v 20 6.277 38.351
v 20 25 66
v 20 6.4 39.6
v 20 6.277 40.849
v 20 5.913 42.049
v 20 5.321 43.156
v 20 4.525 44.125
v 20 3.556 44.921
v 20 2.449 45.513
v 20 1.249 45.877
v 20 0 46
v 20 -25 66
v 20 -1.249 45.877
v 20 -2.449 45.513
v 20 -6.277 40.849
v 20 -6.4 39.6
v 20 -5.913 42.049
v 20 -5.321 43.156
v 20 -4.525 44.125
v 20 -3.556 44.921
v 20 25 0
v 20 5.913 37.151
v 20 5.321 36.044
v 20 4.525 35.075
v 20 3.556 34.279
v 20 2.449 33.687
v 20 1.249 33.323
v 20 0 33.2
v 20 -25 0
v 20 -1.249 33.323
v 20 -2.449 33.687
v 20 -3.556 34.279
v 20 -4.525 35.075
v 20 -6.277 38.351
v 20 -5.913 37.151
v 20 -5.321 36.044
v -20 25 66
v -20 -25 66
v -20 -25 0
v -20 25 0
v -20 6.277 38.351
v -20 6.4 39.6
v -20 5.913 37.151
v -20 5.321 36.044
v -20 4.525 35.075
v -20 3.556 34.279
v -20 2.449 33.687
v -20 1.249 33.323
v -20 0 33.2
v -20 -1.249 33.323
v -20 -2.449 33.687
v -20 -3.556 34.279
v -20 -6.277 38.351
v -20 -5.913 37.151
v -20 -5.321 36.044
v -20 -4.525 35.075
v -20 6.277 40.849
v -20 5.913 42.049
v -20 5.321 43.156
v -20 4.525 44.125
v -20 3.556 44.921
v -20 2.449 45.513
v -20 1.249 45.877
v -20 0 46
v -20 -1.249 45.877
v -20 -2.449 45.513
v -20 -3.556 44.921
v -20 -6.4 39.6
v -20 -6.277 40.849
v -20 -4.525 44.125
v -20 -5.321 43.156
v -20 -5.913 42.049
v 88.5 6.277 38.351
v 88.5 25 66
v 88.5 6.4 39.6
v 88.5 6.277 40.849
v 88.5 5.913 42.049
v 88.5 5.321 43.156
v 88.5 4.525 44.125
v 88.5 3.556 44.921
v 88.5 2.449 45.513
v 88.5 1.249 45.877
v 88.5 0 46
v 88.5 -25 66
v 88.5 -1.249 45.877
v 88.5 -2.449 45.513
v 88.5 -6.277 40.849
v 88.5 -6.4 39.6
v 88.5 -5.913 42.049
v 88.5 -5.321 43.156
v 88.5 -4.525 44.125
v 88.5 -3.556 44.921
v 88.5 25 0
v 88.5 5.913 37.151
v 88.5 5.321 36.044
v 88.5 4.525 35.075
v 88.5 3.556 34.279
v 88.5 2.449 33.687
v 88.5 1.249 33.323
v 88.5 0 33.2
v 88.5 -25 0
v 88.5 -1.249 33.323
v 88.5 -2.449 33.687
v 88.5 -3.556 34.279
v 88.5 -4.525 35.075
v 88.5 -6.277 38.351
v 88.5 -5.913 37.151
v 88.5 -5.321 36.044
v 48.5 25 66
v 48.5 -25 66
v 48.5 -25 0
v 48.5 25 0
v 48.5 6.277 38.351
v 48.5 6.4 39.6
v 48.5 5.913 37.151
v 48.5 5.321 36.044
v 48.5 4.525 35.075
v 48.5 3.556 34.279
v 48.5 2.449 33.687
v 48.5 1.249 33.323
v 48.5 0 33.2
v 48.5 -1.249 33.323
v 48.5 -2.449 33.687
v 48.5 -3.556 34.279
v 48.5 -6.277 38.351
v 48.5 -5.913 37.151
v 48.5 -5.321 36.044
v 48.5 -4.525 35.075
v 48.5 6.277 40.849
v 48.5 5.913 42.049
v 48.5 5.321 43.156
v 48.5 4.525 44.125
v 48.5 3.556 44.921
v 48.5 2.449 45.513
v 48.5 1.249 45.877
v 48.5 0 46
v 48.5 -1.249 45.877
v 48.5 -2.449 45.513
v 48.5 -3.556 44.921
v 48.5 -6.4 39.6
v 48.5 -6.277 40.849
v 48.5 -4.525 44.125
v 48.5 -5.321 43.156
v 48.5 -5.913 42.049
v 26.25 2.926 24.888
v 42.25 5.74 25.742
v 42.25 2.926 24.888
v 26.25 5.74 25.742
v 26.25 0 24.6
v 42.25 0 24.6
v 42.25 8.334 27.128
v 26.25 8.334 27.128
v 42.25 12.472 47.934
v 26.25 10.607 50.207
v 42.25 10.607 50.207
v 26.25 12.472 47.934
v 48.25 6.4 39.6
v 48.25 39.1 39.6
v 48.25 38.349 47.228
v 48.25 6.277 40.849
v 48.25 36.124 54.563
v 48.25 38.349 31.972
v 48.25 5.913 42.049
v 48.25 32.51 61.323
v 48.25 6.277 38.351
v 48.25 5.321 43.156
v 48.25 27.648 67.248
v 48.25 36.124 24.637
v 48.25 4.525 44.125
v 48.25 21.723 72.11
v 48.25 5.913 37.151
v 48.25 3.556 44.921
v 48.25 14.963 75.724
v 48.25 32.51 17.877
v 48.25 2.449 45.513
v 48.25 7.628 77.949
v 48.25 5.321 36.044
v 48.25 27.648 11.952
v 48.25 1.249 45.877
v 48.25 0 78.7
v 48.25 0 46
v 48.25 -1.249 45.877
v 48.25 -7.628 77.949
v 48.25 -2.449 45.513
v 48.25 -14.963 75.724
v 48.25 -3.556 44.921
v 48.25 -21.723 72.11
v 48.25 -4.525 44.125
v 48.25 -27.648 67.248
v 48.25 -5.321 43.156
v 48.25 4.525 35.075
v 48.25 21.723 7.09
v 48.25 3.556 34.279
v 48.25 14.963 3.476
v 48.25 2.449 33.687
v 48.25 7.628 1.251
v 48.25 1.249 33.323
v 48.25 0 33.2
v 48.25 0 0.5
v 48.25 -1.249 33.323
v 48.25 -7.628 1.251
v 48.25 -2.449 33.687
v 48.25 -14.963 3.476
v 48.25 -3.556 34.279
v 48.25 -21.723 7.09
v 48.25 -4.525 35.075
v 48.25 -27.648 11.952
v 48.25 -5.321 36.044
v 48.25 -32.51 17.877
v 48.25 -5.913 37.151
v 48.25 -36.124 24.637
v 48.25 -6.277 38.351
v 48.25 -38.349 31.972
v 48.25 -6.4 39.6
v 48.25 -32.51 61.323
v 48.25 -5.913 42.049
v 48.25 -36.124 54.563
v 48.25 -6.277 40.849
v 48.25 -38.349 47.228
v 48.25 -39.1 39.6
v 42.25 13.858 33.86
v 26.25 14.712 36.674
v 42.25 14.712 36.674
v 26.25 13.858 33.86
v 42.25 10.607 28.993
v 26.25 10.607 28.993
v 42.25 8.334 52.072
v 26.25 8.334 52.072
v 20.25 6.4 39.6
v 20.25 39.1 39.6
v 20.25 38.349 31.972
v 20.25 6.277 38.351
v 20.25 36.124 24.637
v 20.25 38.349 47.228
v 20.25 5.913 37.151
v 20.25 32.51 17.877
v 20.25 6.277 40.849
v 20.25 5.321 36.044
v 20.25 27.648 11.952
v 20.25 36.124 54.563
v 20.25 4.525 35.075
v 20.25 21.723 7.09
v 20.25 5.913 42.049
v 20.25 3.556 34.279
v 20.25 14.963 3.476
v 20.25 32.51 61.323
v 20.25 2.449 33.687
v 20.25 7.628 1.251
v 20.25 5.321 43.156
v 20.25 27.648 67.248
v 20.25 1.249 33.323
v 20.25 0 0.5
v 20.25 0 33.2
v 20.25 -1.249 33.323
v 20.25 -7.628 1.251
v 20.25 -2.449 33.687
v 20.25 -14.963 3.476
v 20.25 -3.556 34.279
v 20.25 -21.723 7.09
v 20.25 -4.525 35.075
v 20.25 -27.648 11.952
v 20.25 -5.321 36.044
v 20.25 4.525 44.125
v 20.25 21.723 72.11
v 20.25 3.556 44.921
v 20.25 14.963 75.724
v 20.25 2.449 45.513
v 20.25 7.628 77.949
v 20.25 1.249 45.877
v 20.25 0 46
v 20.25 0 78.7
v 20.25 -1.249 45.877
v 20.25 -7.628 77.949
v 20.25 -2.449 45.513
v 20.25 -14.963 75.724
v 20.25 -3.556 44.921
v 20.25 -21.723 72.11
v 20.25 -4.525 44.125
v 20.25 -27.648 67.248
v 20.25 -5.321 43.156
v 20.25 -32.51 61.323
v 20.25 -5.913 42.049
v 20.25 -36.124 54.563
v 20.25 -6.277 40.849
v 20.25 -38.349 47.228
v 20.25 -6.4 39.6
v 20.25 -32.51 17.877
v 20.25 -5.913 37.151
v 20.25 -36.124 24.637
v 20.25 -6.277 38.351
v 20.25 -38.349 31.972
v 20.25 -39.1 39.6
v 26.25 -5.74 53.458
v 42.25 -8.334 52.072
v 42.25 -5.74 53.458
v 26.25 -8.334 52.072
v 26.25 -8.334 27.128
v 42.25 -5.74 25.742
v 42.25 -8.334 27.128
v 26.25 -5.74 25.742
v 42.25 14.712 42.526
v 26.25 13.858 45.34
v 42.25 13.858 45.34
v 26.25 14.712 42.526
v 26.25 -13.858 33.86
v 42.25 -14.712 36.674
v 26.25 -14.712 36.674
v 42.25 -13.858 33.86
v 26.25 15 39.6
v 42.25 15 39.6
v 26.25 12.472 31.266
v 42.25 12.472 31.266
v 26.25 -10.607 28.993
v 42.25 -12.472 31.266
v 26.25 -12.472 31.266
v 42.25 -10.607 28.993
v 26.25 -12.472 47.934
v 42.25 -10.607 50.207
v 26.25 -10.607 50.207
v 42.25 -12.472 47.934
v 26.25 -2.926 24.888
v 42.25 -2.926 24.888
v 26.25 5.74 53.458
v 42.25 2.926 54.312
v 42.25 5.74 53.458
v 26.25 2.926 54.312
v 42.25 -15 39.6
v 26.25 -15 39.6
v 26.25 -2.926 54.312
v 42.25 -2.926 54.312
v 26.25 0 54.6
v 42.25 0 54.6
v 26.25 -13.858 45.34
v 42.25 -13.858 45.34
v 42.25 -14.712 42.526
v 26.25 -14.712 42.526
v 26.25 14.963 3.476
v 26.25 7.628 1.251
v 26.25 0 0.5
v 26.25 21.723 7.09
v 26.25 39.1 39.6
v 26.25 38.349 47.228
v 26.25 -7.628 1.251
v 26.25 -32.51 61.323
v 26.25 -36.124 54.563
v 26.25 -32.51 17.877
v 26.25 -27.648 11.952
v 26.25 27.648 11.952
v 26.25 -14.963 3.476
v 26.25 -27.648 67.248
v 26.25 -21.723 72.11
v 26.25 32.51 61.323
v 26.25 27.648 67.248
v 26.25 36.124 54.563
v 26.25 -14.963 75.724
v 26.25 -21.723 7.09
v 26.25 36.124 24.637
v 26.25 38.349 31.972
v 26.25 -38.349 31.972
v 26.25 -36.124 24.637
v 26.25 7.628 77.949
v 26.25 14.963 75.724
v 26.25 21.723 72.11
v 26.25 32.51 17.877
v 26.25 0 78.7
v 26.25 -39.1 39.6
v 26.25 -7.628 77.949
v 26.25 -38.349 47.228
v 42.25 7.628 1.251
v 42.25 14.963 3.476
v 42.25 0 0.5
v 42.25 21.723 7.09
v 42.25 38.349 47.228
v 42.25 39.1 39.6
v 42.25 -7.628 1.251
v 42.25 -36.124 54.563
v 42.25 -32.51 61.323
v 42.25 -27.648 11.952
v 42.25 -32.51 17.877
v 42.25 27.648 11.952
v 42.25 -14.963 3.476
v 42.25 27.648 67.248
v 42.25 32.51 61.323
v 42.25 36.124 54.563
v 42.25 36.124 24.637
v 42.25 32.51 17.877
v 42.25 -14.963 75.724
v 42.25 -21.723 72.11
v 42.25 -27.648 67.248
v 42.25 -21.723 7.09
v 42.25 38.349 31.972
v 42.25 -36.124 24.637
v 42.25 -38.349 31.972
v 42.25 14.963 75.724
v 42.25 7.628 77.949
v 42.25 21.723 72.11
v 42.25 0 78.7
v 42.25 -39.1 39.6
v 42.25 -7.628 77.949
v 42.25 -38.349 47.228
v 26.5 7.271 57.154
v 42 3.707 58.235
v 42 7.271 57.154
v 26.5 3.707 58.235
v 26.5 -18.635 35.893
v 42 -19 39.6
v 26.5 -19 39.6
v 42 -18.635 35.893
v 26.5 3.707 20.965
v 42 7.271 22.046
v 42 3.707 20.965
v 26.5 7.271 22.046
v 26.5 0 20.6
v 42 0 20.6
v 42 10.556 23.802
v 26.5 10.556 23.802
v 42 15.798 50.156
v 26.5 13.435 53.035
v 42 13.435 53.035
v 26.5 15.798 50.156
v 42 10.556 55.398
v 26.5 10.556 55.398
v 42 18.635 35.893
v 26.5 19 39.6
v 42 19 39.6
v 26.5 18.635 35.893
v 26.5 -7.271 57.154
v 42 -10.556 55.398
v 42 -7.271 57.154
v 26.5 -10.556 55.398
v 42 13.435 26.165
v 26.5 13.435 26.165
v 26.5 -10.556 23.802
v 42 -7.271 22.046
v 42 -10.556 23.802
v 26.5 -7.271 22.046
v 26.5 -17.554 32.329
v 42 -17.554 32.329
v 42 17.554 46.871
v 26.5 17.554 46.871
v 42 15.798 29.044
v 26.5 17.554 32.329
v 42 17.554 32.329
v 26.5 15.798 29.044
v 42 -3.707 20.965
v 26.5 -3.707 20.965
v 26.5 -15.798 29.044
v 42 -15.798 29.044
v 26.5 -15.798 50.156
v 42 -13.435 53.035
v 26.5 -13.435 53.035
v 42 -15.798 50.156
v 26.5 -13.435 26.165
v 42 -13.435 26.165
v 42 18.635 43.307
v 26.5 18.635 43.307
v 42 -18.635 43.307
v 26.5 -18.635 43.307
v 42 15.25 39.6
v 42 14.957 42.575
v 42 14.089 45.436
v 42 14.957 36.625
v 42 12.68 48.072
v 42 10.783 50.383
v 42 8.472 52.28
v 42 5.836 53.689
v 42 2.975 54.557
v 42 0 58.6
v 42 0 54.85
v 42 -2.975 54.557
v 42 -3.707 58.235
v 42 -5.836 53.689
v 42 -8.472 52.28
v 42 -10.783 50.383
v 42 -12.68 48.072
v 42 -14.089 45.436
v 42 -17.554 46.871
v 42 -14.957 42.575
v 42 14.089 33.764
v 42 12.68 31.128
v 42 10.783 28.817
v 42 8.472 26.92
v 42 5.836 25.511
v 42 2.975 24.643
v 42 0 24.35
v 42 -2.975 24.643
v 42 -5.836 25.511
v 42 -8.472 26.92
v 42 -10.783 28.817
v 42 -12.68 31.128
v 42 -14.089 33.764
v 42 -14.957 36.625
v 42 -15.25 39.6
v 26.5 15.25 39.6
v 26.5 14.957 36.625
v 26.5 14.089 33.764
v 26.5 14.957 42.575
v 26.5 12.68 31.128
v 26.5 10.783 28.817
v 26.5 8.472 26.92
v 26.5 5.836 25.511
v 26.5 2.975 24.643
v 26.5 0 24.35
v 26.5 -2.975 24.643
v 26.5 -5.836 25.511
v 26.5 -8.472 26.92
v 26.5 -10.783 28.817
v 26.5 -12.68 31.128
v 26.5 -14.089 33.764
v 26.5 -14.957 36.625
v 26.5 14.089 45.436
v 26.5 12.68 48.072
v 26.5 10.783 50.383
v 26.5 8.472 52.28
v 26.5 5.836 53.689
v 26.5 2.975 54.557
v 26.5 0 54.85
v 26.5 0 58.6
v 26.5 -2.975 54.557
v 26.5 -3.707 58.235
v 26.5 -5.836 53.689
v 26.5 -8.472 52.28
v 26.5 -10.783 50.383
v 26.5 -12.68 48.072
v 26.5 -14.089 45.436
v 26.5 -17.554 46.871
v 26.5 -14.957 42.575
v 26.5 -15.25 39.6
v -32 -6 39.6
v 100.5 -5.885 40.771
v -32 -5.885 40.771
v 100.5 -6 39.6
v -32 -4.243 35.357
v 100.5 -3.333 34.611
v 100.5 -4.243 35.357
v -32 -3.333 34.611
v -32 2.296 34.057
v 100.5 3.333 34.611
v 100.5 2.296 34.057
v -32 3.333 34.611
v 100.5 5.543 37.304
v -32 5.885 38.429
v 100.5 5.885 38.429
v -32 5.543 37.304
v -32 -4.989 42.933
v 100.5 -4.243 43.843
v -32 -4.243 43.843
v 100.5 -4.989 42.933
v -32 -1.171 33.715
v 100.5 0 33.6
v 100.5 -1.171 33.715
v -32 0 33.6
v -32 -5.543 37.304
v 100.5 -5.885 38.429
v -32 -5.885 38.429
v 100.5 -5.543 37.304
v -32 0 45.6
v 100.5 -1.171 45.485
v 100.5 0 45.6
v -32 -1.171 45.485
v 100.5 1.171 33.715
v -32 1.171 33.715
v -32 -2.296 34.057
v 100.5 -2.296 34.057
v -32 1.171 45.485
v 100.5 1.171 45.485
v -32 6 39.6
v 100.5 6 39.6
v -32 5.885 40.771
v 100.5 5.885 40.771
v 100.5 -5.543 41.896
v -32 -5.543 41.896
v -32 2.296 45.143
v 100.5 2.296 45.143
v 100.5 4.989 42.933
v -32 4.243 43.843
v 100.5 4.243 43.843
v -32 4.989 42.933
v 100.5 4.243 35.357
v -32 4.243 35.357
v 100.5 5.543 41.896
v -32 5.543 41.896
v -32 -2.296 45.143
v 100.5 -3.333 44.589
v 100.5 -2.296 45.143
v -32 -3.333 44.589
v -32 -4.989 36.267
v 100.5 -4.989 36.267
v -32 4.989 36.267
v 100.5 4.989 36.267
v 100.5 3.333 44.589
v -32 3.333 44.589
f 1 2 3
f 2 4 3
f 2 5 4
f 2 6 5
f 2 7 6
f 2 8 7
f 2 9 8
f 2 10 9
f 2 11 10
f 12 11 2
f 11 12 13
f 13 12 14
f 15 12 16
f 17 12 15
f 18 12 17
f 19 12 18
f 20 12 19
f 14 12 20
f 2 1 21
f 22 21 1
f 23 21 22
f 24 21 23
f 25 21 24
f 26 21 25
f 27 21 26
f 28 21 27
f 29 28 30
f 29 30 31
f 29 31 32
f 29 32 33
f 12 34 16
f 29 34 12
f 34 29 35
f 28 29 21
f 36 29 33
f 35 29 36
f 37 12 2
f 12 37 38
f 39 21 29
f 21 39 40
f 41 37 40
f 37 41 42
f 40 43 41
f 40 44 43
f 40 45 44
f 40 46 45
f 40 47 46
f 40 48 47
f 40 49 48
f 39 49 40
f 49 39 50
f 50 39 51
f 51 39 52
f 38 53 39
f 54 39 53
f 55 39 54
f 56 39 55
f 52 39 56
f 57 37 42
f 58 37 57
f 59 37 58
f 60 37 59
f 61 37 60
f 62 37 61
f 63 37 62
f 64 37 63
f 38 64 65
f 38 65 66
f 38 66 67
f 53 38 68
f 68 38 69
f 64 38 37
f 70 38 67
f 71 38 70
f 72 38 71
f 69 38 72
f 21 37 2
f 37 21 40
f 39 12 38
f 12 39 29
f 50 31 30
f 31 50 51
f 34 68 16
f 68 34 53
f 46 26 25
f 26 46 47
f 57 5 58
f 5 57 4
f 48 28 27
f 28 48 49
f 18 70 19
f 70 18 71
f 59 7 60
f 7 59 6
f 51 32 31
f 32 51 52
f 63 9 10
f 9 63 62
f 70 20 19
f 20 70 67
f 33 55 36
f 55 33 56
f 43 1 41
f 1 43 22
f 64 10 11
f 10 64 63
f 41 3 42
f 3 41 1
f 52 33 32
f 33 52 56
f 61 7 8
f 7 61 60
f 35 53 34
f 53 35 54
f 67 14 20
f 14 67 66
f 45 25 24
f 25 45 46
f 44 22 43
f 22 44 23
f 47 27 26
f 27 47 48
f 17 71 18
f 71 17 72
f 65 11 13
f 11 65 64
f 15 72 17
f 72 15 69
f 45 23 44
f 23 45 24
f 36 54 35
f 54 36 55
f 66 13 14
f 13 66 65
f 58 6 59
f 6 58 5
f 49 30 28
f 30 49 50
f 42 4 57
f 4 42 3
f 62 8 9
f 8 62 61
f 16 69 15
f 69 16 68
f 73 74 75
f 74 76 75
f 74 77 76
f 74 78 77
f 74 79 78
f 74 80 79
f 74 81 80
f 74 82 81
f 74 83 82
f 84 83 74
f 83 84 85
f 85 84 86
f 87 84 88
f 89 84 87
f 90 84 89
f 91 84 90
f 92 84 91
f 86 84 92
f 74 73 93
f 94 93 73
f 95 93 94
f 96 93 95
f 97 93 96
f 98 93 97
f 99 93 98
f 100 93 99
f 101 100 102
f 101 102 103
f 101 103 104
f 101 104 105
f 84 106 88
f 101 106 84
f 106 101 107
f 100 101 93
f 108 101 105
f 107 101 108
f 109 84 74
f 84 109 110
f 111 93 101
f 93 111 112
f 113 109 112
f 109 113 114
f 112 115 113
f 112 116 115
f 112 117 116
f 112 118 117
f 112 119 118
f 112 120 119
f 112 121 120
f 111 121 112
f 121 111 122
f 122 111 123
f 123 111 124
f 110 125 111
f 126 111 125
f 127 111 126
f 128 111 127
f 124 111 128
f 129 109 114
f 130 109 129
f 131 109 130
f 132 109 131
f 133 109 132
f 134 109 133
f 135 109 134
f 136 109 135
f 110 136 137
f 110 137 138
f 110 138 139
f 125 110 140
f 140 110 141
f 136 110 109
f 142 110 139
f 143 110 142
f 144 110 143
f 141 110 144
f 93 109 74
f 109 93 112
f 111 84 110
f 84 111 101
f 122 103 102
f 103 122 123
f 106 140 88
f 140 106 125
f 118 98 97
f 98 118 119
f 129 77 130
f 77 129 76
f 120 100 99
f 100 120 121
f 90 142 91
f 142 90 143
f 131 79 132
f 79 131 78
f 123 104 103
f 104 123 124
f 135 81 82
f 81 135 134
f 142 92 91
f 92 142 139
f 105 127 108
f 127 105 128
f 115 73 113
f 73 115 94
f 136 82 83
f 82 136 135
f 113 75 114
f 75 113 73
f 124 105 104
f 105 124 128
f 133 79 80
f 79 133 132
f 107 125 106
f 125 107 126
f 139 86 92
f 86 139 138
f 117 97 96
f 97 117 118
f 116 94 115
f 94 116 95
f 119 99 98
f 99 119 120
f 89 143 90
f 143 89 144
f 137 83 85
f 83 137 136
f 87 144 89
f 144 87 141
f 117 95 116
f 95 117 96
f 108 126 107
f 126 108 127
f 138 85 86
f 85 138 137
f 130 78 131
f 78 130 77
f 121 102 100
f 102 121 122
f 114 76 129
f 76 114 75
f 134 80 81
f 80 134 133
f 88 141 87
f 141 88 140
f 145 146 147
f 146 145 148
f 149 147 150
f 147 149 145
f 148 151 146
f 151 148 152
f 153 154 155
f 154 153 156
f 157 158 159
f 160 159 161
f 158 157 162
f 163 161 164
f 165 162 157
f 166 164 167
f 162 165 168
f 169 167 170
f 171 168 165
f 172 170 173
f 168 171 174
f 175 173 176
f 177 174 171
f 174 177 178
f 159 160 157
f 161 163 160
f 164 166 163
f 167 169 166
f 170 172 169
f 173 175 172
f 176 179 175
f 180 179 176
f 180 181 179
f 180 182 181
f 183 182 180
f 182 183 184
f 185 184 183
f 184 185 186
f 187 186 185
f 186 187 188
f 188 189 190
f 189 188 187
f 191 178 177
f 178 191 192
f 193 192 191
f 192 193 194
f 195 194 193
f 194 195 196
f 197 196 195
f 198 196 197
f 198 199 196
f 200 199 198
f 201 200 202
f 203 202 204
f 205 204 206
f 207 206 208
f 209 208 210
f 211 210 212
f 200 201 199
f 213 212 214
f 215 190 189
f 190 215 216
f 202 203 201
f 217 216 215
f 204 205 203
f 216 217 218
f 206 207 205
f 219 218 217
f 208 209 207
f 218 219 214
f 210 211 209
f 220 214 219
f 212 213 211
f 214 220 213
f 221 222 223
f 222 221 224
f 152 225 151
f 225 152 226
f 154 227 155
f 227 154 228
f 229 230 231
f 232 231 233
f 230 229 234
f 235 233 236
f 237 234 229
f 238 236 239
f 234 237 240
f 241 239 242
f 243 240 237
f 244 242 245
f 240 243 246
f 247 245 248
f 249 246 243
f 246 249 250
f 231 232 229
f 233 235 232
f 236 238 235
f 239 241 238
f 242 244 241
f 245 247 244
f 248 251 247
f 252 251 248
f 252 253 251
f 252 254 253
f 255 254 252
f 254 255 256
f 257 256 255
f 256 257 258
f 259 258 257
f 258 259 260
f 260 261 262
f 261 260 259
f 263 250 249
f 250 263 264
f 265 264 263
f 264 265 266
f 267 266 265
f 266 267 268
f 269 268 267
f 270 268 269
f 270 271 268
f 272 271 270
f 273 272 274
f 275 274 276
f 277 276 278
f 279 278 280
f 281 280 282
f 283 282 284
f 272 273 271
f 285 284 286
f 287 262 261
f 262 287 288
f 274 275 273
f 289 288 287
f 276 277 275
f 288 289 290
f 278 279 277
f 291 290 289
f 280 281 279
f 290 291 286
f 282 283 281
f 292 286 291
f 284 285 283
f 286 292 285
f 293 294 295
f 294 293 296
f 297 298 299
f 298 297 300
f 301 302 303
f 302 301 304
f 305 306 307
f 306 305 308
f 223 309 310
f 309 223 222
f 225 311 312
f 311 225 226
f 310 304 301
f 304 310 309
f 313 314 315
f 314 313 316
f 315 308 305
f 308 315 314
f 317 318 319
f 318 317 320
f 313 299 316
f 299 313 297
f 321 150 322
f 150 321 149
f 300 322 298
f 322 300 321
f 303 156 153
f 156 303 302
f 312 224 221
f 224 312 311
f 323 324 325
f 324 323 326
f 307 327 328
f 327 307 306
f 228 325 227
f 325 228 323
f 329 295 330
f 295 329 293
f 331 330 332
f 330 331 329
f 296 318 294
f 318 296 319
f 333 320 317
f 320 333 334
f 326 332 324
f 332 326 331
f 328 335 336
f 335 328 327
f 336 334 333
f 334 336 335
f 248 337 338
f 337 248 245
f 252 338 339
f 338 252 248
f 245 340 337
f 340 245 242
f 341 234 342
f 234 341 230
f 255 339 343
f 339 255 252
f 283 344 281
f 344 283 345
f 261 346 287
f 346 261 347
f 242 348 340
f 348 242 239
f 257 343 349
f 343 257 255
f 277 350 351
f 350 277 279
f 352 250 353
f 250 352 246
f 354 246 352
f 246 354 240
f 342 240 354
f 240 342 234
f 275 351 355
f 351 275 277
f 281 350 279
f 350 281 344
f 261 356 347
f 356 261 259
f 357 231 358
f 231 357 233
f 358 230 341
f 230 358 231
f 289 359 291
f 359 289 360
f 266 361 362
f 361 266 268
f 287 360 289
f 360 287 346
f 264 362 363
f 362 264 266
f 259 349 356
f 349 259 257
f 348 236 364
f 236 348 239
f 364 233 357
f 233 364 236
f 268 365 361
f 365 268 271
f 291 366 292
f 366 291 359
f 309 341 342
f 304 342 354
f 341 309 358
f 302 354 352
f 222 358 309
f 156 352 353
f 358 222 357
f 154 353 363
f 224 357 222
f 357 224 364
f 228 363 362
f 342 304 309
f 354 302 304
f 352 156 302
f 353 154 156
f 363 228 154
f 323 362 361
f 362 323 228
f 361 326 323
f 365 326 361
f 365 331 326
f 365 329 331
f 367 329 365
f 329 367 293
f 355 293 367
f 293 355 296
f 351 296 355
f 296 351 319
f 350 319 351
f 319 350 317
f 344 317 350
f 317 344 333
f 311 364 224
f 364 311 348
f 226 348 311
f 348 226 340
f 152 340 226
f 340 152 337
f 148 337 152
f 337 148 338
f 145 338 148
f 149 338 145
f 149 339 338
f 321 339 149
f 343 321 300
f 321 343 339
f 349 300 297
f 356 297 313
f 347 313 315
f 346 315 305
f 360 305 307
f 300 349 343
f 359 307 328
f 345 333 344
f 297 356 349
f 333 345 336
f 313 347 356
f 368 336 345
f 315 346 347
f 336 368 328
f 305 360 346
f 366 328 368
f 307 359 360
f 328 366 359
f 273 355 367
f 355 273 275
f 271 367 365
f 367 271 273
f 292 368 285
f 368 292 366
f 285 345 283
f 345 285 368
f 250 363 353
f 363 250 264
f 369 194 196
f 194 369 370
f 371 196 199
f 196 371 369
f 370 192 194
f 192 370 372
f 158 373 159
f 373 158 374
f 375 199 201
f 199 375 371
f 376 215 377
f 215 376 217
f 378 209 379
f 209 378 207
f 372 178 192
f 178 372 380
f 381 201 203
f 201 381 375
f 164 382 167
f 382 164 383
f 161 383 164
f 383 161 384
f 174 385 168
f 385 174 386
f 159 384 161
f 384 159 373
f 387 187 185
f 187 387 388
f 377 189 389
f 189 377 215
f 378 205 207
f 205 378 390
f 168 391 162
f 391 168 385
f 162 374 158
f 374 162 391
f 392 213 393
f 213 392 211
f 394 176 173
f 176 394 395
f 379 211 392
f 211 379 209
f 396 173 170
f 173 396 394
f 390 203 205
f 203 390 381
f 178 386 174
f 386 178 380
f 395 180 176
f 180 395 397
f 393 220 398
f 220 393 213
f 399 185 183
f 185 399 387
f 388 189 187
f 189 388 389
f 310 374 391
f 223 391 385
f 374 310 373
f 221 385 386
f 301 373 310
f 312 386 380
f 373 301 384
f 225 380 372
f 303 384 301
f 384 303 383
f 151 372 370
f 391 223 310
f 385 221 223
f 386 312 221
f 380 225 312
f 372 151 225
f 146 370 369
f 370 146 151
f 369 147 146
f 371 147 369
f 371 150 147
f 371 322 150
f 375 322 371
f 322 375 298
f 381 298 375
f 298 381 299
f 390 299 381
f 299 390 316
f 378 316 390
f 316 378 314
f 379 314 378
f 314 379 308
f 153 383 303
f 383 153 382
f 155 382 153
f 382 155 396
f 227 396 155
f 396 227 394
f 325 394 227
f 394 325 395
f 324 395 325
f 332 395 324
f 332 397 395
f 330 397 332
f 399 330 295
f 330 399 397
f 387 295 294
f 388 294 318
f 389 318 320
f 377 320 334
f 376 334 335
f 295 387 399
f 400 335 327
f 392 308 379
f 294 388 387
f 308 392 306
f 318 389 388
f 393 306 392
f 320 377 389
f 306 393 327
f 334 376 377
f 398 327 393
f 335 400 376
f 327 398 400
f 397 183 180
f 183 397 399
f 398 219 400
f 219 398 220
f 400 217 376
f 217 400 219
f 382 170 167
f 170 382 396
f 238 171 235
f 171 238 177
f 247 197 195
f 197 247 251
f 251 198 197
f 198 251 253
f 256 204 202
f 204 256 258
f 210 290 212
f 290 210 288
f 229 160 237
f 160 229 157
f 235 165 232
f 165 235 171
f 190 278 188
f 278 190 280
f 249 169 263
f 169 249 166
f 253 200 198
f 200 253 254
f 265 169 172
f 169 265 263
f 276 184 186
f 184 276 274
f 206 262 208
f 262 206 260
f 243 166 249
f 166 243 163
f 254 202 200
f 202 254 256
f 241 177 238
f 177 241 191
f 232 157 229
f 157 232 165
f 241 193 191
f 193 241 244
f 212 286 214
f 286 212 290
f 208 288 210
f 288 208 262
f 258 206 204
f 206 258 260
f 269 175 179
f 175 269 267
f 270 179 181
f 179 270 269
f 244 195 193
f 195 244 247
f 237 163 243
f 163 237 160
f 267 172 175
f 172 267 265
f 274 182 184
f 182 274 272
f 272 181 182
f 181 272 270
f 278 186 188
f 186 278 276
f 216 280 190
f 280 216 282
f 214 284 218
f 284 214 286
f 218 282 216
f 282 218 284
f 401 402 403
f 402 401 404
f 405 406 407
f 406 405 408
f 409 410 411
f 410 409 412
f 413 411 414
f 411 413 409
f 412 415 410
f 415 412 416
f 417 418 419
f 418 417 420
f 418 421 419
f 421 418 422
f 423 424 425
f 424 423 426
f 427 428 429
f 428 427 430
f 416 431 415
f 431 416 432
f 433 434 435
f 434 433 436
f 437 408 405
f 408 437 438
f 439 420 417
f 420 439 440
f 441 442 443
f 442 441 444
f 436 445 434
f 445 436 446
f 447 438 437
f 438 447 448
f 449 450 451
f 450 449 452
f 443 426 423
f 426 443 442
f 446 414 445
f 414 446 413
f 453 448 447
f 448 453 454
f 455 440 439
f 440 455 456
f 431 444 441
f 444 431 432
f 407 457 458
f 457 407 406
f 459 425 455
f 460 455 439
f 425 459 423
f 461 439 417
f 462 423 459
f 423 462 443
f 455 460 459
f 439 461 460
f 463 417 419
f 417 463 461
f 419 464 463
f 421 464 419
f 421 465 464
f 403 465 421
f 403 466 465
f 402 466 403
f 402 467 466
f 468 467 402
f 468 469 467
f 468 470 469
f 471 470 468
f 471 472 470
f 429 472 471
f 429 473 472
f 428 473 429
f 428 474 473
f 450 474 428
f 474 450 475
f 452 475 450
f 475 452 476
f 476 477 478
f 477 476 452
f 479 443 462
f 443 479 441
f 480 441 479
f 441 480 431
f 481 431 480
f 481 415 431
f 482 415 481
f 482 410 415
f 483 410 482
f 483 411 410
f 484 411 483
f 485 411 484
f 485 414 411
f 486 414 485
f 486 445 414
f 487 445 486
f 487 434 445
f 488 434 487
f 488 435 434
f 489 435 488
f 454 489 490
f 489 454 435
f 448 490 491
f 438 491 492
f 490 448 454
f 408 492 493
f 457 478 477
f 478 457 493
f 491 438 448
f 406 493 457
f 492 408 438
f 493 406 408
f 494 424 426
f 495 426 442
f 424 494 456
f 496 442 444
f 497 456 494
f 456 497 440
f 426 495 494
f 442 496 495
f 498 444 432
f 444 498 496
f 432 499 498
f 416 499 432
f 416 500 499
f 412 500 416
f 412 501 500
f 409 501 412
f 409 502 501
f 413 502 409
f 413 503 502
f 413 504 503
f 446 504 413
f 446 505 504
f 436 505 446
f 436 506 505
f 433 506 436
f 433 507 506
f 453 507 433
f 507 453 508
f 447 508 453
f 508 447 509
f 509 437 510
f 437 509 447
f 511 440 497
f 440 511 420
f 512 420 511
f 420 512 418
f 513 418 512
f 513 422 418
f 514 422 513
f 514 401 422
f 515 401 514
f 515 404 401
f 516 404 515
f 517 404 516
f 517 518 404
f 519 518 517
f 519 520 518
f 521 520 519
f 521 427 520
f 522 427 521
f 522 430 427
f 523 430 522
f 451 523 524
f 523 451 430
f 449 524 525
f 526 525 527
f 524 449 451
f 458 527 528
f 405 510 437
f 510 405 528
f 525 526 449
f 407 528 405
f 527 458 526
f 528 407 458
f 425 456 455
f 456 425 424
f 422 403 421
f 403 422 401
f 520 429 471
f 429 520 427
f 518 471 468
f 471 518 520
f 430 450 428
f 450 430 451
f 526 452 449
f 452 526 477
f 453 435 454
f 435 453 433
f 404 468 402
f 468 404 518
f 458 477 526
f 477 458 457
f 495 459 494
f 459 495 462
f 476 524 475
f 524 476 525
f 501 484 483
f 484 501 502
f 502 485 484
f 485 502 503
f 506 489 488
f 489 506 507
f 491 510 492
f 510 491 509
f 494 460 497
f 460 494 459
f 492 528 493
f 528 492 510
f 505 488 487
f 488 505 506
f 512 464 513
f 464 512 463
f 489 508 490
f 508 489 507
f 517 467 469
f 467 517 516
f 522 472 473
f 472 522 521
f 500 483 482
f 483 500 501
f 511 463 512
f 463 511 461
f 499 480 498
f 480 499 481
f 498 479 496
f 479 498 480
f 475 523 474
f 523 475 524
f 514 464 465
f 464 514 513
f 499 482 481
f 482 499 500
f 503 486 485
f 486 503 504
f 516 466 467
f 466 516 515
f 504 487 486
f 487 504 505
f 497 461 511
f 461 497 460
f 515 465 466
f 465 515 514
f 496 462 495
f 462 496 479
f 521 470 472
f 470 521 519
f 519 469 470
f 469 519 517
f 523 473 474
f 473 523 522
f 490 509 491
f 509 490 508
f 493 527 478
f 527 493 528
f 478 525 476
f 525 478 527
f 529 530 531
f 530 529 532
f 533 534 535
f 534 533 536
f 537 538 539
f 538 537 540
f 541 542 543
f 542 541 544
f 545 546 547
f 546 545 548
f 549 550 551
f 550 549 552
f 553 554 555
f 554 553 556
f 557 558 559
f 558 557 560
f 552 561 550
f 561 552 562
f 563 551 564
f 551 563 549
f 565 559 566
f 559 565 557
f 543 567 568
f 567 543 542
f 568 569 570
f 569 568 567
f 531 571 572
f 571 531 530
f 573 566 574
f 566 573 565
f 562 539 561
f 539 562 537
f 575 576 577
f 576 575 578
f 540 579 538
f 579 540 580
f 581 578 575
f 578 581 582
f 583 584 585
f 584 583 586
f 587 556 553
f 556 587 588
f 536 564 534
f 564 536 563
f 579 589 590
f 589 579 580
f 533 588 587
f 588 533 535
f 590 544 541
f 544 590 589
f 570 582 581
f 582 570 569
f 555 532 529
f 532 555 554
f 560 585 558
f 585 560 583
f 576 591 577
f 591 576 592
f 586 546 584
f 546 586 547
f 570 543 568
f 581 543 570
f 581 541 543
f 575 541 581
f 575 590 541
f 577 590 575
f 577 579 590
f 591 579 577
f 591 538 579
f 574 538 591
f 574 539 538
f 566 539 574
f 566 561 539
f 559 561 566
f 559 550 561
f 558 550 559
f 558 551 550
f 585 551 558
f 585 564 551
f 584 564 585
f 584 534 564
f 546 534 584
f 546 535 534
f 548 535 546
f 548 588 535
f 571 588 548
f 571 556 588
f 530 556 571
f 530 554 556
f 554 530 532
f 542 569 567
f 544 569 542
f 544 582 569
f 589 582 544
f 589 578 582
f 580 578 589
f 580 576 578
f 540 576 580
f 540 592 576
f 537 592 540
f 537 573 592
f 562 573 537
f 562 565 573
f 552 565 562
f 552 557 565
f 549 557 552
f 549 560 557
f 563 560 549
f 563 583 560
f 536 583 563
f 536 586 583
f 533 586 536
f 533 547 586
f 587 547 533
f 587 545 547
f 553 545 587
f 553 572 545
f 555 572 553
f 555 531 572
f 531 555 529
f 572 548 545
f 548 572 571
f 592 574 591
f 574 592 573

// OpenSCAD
$fn = 32;

// ------------------------------------------------------------------------
// Pulley assembly: d78.2 pulley with a belt, shaft d12
// Every part is its own module, assembly() places them once.
// ------------------------------------------------------------------------

// --- part 1 ---
module support1() {
  difference() {
    translate([-20, -25, 0]) cube([40, 50, 66]);
    translate([0, 0, 39.6]) rotate([0, 90, 0]) cylinder(h = 42, d = 12.8, center = true);
  }
}

// --- part 2 ---
module support2() {
  difference() {
    translate([-20, -25, 0]) cube([40, 50, 66]);
    translate([0, 0, 39.6]) rotate([0, 90, 0]) cylinder(h = 42, d = 12.8, center = true);
  }
}

// --- part 3 ---
module shaft() {
  translate([0, 0, -66.25]) cylinder(h = 132.5, d = 12);
}

// --- part 4 ---
module pulley() {
  difference() {
    union() {
      cylinder(h = 28, d = 30);
      cylinder(h = 6, d = 78.2);
      translate([0, 0, 22]) cylinder(h = 6, d = 78.2);
    }
    translate([0, 0, -1]) cylinder(h = 30, d = 12.8);
  }
}

// --- part 5 ---
module belt() {
  difference() {
      translate([0, 0, 0]) cylinder(h = 15.5, d = 38);
      translate([0, 0, -1]) cylinder(h = 17.5, d = 30.5);
    }
}

// --- assembly ---
module assembly() {
  translate([0, 0, 0]) rotate([0, 0, 0]) support1();
  translate([68.5, 0, 0]) rotate([0, 0, 0]) support2();
  translate([34.25, 0, 39.6]) rotate([0, 90, 0]) shaft();
  translate([20.25, 0, 39.6]) rotate([0, 90, 0]) pulley();
  translate([26.5, 0, 39.6]) rotate([0, 90, 0]) belt();
}

assembly();
